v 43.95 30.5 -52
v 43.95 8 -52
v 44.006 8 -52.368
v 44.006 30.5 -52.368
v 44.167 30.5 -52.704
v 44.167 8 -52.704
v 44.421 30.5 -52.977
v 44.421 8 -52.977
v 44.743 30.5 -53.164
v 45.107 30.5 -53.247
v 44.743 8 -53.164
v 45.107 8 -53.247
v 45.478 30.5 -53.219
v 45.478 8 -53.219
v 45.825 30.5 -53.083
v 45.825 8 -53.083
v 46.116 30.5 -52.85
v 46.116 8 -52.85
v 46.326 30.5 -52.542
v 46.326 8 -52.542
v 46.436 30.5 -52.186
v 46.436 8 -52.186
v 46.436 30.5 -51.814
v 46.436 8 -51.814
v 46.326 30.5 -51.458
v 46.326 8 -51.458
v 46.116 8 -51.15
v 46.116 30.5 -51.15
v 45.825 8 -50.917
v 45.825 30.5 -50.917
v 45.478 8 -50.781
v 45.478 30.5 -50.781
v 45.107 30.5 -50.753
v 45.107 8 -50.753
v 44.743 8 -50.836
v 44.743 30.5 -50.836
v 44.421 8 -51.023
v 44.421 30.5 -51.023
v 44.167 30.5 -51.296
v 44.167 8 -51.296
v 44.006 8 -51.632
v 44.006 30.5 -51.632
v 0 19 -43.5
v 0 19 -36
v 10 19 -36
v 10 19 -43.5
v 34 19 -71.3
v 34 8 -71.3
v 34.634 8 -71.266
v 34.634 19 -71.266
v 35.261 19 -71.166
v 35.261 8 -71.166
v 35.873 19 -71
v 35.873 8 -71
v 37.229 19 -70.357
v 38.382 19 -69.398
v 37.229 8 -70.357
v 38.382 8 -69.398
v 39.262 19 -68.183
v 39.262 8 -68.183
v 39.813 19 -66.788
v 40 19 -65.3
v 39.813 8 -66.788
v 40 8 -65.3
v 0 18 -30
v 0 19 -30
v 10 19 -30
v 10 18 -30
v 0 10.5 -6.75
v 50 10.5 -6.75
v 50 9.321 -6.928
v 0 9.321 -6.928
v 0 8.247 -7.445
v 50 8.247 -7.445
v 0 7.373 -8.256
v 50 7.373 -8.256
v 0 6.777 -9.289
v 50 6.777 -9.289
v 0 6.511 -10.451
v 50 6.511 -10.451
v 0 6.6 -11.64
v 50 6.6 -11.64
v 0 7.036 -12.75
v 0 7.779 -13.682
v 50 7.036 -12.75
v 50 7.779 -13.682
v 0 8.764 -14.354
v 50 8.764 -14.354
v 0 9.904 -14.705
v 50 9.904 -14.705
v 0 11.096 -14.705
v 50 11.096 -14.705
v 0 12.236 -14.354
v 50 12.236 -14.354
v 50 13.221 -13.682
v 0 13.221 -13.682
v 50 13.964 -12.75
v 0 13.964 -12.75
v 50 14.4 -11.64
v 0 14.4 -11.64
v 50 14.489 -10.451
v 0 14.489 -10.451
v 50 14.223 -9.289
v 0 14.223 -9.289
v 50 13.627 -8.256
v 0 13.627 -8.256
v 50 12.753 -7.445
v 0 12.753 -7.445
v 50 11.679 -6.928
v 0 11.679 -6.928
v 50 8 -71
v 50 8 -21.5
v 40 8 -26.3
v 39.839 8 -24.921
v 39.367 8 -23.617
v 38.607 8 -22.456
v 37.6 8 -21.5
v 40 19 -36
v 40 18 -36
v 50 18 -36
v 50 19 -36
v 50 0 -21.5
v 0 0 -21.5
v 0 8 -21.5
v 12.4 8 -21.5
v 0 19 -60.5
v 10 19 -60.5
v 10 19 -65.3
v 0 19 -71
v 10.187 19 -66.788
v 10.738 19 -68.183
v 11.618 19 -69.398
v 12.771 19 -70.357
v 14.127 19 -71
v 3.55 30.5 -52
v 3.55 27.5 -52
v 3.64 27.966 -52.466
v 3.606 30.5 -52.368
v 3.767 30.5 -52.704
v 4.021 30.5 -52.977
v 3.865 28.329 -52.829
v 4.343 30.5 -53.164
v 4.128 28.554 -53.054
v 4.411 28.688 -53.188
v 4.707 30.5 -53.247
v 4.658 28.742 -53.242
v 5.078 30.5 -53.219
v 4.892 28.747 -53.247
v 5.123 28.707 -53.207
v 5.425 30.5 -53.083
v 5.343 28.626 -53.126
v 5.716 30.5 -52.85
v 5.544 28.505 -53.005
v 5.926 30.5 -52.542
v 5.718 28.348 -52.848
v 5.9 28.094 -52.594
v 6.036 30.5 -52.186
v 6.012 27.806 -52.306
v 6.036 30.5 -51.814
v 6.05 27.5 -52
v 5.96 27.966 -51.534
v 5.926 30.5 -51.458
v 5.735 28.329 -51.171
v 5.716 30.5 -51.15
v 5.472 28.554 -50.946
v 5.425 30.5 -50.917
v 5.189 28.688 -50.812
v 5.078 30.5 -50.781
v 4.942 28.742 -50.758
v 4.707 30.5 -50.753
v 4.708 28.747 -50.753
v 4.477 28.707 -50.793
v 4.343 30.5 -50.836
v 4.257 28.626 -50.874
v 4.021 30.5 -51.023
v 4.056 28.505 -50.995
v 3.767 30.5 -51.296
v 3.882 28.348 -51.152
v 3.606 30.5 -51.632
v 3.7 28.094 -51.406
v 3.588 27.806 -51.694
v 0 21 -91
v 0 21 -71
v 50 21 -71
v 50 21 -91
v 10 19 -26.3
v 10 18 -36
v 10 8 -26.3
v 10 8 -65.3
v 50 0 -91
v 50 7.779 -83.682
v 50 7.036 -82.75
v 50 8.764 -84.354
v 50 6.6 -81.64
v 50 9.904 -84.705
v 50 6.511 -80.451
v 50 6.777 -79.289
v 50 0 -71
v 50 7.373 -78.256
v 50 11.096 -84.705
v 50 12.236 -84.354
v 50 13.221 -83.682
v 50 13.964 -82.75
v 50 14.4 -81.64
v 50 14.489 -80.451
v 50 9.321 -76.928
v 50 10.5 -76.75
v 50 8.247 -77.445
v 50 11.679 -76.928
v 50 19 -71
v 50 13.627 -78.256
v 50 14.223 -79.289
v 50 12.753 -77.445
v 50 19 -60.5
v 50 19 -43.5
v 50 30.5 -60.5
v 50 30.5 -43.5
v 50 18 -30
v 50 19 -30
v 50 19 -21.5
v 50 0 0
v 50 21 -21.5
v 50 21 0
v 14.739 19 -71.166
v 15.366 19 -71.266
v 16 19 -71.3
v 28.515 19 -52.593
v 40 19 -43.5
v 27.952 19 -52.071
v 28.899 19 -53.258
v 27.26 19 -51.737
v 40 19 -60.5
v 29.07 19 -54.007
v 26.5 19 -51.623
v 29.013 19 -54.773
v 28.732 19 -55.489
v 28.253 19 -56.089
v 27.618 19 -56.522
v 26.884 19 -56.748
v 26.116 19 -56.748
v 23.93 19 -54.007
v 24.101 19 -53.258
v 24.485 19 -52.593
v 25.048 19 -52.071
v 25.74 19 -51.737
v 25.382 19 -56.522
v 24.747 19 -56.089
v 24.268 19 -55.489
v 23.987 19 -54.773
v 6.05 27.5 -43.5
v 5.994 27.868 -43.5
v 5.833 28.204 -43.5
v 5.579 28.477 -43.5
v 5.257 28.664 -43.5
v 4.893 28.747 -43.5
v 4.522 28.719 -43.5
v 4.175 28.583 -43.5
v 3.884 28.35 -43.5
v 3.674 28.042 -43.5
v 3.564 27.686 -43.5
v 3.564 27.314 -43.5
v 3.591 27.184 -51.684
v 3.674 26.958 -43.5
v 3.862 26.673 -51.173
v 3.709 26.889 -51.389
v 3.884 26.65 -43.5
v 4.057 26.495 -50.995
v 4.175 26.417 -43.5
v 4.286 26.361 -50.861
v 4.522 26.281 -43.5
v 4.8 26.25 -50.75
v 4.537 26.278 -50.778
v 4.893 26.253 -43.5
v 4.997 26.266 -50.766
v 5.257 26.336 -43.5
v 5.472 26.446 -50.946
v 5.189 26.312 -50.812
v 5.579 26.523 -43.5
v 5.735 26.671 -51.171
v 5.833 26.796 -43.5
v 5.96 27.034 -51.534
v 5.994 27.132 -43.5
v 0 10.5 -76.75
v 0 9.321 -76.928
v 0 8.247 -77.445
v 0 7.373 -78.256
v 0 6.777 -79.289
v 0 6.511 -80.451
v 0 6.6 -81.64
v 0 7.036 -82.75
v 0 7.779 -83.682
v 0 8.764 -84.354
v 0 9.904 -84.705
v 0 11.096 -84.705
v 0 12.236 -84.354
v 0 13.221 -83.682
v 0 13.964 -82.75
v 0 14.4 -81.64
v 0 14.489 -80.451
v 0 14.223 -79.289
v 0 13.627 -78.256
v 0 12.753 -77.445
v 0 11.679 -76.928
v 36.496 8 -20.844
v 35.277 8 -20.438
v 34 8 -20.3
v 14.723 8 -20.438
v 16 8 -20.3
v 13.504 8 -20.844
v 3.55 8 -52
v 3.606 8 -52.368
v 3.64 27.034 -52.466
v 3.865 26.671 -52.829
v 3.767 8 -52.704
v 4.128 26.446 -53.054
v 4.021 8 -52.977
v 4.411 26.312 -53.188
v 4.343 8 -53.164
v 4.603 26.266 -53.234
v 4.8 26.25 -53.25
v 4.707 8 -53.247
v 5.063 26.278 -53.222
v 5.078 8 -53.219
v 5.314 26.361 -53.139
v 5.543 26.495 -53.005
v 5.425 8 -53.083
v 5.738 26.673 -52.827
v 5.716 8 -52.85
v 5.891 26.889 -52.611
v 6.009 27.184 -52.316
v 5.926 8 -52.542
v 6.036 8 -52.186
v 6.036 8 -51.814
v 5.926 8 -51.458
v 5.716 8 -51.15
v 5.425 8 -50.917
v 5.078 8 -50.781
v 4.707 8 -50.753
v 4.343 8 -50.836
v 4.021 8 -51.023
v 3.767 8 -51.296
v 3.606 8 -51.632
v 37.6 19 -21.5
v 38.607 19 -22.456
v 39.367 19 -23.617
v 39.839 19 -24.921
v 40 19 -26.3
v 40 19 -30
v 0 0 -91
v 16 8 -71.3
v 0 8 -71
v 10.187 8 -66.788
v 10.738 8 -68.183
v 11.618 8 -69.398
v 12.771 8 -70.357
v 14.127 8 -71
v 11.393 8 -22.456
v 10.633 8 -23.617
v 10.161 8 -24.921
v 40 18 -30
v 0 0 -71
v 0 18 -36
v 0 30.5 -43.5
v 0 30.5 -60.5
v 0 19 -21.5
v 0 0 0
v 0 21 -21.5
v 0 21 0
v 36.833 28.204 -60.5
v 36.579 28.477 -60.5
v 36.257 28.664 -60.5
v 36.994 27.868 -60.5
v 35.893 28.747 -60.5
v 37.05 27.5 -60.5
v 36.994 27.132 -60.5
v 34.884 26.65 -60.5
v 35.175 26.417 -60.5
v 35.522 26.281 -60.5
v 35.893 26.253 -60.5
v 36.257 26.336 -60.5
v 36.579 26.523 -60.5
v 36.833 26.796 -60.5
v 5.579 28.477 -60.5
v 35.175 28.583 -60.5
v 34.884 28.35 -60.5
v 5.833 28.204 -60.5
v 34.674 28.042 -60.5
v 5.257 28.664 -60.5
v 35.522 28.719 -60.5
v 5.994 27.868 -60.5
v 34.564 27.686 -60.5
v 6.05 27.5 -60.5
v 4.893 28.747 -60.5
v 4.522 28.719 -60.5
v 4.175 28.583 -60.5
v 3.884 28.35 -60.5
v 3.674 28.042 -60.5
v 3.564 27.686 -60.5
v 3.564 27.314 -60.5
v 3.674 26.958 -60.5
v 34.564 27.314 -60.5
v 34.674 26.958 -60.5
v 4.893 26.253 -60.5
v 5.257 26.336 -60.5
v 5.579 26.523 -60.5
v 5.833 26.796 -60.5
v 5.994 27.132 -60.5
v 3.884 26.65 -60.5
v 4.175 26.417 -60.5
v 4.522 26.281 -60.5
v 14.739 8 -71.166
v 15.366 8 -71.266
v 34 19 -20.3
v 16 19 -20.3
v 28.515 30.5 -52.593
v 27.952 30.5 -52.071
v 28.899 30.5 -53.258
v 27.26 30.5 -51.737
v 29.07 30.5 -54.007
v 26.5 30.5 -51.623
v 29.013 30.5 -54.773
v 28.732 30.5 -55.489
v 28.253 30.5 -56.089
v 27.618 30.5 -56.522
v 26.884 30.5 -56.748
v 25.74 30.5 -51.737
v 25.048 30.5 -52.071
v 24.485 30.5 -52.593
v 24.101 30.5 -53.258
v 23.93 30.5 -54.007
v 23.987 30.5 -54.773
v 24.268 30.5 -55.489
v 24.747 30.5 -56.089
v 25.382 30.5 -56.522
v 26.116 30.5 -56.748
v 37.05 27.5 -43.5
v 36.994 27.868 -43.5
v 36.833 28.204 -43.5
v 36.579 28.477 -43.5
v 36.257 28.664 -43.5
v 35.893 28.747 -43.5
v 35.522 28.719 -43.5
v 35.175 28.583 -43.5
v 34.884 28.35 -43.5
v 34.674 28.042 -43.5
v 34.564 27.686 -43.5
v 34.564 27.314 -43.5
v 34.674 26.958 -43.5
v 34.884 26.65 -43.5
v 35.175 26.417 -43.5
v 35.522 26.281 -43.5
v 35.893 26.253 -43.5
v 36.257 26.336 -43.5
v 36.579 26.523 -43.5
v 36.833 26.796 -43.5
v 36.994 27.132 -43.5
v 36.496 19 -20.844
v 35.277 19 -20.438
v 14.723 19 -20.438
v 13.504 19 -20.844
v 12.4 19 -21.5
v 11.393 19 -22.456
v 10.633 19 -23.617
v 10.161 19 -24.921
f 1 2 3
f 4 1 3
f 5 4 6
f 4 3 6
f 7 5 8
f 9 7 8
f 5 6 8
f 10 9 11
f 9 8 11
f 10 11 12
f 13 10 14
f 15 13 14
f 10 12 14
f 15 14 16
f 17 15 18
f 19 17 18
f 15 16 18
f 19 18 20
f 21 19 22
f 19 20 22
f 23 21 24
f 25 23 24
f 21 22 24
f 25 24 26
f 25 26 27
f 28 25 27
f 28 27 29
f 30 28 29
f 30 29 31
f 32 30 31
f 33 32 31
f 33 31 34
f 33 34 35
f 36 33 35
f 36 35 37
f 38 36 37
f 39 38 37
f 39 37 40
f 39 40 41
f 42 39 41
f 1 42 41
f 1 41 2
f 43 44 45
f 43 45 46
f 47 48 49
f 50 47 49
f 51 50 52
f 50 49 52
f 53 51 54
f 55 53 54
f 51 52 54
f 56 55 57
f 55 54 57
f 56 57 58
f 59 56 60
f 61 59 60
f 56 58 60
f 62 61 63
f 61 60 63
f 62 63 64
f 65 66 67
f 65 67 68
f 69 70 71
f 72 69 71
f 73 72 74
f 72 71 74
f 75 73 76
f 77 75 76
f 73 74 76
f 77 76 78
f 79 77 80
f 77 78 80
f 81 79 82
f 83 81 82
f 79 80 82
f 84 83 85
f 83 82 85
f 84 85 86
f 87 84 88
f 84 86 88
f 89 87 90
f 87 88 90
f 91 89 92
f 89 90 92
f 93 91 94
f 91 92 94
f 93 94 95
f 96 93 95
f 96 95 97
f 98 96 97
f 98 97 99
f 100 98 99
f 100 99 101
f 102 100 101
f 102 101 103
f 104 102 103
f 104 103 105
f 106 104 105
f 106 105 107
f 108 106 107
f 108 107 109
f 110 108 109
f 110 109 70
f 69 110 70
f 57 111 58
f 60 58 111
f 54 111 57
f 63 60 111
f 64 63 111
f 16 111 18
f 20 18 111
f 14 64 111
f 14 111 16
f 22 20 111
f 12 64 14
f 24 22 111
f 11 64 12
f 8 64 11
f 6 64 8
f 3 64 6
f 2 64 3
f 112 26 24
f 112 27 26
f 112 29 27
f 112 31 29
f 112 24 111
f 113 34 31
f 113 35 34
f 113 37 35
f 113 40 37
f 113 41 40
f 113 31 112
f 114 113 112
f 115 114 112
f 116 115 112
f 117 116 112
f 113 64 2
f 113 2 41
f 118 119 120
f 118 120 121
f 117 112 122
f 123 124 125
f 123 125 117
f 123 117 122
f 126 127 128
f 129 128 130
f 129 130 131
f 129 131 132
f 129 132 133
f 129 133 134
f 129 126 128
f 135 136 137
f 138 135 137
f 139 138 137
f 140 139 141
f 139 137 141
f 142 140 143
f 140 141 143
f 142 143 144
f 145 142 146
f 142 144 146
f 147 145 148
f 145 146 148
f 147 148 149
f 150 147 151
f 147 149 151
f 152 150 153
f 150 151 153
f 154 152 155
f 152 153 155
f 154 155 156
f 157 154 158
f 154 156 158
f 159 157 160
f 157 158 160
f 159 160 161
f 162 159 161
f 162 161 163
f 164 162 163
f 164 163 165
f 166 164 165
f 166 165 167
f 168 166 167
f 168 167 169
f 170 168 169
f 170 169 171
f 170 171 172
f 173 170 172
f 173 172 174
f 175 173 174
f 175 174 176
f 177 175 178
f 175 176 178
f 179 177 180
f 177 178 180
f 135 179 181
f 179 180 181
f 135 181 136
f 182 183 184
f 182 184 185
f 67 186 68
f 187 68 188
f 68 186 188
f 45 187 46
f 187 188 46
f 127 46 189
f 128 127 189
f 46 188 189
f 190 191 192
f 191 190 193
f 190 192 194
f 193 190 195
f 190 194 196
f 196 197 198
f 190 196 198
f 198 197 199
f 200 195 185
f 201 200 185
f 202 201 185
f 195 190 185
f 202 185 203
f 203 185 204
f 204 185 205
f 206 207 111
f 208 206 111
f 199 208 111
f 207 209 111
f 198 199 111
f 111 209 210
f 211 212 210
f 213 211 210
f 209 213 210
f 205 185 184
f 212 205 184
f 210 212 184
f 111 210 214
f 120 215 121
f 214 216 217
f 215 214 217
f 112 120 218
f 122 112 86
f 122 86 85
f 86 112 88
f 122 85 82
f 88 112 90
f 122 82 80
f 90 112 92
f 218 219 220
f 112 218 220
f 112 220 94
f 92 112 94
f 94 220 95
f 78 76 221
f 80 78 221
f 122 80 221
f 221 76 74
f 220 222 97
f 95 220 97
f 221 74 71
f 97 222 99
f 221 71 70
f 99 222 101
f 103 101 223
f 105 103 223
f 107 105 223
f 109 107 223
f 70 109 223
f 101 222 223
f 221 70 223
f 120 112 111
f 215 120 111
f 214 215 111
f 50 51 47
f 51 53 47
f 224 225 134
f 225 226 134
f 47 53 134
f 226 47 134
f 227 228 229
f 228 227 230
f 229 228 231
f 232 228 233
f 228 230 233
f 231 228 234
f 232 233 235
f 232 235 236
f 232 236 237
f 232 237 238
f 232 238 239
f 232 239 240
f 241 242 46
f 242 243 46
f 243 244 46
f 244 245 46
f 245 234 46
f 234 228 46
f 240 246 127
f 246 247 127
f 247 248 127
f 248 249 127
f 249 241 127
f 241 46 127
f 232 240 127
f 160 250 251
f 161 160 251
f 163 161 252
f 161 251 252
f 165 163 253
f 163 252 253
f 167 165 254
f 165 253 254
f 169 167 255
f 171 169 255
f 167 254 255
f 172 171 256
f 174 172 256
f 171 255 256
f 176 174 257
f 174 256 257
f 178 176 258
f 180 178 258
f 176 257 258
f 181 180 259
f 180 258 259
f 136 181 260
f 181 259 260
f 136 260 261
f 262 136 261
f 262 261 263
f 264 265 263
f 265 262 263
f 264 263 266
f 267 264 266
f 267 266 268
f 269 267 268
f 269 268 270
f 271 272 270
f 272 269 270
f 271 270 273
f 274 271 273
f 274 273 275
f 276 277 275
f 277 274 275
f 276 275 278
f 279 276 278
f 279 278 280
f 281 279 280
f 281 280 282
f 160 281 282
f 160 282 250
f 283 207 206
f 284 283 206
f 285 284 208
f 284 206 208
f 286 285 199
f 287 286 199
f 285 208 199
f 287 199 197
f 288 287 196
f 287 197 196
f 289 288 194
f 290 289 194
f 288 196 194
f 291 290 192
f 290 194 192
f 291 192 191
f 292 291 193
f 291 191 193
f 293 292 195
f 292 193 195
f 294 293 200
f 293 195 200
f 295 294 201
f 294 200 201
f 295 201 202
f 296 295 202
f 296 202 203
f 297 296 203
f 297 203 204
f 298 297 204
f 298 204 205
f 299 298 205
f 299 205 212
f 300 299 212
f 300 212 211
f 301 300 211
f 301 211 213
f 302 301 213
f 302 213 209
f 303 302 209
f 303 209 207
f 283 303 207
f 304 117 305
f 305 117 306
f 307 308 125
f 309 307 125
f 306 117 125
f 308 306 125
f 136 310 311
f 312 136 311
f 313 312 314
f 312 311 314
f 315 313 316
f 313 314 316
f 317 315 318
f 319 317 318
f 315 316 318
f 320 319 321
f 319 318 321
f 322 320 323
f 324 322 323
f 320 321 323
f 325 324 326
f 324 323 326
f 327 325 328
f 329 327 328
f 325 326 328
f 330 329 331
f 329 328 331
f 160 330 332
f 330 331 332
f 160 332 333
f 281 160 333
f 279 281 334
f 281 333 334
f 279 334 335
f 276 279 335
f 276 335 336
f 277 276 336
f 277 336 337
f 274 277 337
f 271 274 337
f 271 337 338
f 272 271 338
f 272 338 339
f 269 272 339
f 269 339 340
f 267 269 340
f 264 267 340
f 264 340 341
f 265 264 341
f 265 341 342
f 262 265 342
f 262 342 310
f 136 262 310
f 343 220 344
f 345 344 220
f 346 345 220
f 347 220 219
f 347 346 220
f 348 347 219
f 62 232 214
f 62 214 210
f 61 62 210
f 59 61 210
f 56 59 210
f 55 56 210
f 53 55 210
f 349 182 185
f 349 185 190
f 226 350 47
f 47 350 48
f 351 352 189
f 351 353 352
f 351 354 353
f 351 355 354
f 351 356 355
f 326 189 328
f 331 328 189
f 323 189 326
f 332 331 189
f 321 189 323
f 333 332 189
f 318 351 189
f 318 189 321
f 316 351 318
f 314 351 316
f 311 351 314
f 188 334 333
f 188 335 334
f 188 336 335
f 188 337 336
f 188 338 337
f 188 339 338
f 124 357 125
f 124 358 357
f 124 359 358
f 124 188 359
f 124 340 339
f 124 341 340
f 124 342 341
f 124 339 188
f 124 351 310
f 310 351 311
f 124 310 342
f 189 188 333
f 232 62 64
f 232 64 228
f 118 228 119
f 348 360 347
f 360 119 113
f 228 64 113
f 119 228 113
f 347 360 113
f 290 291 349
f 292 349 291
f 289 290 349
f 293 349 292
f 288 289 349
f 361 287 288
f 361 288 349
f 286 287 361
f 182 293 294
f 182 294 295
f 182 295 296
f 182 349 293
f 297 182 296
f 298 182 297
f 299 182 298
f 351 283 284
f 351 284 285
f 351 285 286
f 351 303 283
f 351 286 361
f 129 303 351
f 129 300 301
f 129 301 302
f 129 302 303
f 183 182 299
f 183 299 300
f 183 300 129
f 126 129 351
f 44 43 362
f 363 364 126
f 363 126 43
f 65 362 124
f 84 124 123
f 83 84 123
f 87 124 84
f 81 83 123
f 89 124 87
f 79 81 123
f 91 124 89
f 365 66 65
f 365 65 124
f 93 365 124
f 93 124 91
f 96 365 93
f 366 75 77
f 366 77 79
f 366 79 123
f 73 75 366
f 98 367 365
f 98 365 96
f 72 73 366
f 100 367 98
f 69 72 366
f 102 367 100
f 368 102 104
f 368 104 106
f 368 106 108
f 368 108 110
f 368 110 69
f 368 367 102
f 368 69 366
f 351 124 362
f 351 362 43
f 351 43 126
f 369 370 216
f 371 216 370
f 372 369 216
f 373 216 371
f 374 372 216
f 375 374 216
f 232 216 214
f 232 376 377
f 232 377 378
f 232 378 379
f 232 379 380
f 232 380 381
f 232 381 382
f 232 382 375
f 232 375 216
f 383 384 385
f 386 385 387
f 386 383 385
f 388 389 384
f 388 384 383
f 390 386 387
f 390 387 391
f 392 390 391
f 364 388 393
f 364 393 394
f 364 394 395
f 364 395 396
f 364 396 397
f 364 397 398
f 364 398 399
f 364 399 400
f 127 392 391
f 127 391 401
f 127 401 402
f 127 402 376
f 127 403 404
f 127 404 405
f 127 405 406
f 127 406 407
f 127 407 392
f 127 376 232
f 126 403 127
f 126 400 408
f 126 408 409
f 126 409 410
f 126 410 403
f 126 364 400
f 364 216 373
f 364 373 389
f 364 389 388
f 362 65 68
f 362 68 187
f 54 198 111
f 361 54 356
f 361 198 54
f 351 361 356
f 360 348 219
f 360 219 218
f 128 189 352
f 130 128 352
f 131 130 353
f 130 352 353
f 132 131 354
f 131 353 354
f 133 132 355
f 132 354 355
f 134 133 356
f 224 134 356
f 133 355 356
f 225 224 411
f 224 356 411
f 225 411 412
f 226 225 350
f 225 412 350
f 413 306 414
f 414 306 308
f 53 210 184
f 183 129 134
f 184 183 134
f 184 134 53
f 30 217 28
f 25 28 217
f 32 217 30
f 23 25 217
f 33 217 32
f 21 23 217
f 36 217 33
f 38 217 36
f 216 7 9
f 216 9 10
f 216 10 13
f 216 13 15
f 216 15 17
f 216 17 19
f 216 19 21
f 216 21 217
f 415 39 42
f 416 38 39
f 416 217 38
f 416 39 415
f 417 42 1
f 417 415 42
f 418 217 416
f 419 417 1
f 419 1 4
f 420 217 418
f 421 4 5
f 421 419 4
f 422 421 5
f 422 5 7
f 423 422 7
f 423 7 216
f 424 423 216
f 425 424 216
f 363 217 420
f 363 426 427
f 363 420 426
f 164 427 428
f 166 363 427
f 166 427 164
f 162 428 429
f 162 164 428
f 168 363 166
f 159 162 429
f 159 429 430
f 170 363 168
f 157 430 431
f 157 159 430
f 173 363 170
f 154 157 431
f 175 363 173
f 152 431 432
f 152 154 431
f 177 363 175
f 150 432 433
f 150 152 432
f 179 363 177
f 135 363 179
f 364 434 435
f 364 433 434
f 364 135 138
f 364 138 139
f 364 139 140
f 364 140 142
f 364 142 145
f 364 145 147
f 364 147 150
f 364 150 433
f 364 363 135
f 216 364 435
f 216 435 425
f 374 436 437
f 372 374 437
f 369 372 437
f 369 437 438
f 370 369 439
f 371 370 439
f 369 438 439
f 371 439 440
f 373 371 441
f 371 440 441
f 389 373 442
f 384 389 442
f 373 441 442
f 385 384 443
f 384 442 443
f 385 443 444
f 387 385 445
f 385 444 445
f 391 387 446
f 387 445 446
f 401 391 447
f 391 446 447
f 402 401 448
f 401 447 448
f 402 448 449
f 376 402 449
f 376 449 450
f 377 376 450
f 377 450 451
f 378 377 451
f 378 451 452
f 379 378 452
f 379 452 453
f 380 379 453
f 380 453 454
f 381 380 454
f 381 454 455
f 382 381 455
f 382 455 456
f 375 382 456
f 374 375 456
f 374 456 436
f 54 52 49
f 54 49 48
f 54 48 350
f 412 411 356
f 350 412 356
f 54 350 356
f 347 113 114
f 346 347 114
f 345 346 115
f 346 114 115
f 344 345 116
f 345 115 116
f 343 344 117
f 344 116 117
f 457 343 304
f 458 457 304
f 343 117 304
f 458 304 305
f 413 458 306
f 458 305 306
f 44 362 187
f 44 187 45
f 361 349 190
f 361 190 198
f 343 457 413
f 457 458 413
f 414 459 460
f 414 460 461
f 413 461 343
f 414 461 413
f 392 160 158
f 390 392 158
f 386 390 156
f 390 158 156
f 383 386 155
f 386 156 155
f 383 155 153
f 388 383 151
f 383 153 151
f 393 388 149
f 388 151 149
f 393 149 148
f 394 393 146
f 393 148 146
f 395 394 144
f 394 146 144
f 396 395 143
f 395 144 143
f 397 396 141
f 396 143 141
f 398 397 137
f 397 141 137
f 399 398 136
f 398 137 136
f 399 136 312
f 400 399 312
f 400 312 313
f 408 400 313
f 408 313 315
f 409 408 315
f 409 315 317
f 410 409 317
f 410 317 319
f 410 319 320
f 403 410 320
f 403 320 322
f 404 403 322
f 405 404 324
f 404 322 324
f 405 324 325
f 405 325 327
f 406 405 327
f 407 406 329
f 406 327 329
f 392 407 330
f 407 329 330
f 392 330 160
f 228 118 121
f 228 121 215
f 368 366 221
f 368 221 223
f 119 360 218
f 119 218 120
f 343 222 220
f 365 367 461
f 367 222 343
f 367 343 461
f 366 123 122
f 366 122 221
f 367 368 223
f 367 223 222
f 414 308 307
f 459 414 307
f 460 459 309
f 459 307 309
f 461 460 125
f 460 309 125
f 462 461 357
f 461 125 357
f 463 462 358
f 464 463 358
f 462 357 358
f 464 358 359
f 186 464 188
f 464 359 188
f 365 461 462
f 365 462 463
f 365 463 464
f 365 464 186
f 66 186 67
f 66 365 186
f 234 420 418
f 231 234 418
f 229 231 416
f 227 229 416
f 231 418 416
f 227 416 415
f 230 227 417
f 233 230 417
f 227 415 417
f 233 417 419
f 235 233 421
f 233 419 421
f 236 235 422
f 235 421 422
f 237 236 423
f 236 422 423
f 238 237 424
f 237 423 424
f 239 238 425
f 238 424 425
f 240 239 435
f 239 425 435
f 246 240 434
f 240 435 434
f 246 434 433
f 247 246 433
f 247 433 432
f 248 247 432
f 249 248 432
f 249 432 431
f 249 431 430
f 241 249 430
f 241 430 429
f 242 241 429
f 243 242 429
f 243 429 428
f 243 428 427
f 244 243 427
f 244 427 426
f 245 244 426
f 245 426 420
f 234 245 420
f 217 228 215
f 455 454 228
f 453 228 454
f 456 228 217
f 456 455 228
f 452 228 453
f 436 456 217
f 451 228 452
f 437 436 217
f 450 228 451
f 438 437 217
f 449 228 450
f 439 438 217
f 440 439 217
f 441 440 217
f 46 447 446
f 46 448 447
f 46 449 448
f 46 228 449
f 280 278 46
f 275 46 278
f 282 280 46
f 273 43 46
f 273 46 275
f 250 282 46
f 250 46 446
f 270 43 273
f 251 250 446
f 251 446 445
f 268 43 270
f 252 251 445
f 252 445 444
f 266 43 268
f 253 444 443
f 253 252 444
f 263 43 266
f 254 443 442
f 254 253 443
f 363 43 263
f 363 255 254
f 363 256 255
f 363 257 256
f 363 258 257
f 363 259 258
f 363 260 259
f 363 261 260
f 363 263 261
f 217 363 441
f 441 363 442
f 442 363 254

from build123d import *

# Parameters (mm, degrees)
BOSS_EXTRUDE1_DEPTH            = 50
CUT_EXTRUDE1_REACH             = 108.241
M3_TAPPED_HOLE1_D              = 2.5
M3_TAPPED_HOLE2_D              = 2.5
SKETCH7_R                      = 2.577157182
CUT_EXTRUDE2_DEPTH             = 109.218528913
CUT_EXTRUDE3_REACH             = 110.219
SKETCH8_R                      = 4
CUT_EXTRUDE3_DIRECTION_2_DEPTH = 109.218528913


with BuildPart() as part:
    # Sketch1 → Boss-Extrude1 (new body)
    with BuildSketch(Plane(origin=(0, 0, 0), x_dir=(0, 0, -1), z_dir=(1, 0, 0))):
        Polygon((0, 0), (0, 21), (21.5, 21), (21.5, 19), (30, 19), (30, 18), (36, 18), (36, 19), (43.5, 19), (43.5, 30.5), (60.5, 30.5), (60.5, 19), (71, 19), (71, 21), (91, 21), (91, 0), (71, 0), (71, 8), (21.5, 8), (21.5, 0), align=None)
    extrude(amount=BOSS_EXTRUDE1_DEPTH)

    # Cut-Extrude1: up to this face of the body (flat: up to its plane)
    cut_extrude1_end = Plane(part.part.faces().sort_by_distance((25, 19, -65.75))[0])
    # Sketch2 → Cut-Extrude1 (cut, up to the picked face)
    with BuildSketch(Plane(origin=(0, 8, 0), x_dir=(1, 0, 0), z_dir=(0, 1, 0)), mode=Mode.PRIVATE) as cut_extrude1_sk1:
        with BuildLine():
            Line((16, 71.3), (34, 71.3))
            ThreePointArc((34, 71.3), (38.242640687, 69.542640687), (40, 65.3))
            Line((40, 65.3), (40, 26.3))
            ThreePointArc((40, 26.3), (38.242640687, 22.057359313), (34, 20.3))
            Line((34, 20.3), (16, 20.3))
            ThreePointArc((16, 20.3), (11.757359313, 22.057359313), (10, 26.3))
            Line((10, 26.3), (10, 65.3))
            ThreePointArc((10, 65.3), (11.757359313, 69.542640687), (16, 71.3))
        make_face()
    cut_extrude1_tool1 = split(extrude(cut_extrude1_sk1.sketch, amount=CUT_EXTRUDE1_REACH, mode=Mode.PRIVATE), bisect_by=cut_extrude1_end, keep=Keep.BOTH, mode=Mode.PRIVATE)
    add(cut_extrude1_tool1.solids().sort_by(Axis((25, 8, -45.8), (0, 1, 0)))[0], mode=Mode.SUBTRACT)

    # M3 Tapped Hole1 (through all)
    with Locations(Plane(origin=(0, 30.5, 0), x_dir=(1, 0, 0), z_dir=(0, 1, 0))):
        with Locations((4.8, 52), (45.2, 52)):
            Hole(M3_TAPPED_HOLE1_D / 2)

    # M3 Tapped Hole2 (through all)
    with Locations(Plane(origin=(0, 0, -60.5), x_dir=(-1, 0, 0), z_dir=(0, 0, -1))):
        with Locations((-4.8, 27.5), (-35.8, 27.5)):
            Hole(M3_TAPPED_HOLE2_D / 2)

    # Sketch7 → Cut-Extrude2 (cut, through all)
    with BuildSketch(Plane(origin=(0, 30.5, 0), x_dir=(1, 0, 0), z_dir=(0, 1, 0))):
        with Locations(Location((26.5, 54.2, 0), (0, 0, 270))):
            Circle(SKETCH7_R)
    extrude(amount=-CUT_EXTRUDE2_DEPTH, mode=Mode.SUBTRACT)

    # Sketch8 → Cut-Extrude3 (cut, up to next)
    with BuildSketch(Plane(origin=(50, 0, 0), x_dir=(0, 0, -1), z_dir=(1, 0, 0)), mode=Mode.PRIVATE) as cut_extrude3_sk1:
        with Locations(Location((10.75, 10.5, 0), (0, 0, 180))):
            Circle(SKETCH8_R)
    cut_extrude3_tool1 = extrude(cut_extrude3_sk1.sketch, amount=-CUT_EXTRUDE3_REACH, mode=Mode.PRIVATE) & part.part
    # Sketch8 → Cut-Extrude3 (cut, up to next)
    with BuildSketch(Plane(origin=(50, 0, 0), x_dir=(0, 0, -1), z_dir=(1, 0, 0)), mode=Mode.PRIVATE) as cut_extrude3_sk2:
        with Locations(Location((80.75, 10.5, 0), (0, 0, 180))):
            Circle(SKETCH8_R)
    cut_extrude3_tool2 = extrude(cut_extrude3_sk2.sketch, amount=-CUT_EXTRUDE3_REACH, mode=Mode.PRIVATE) & part.part
    add(cut_extrude3_tool1.solids().sort_by_distance((50, 10.5, -10.75))[0], mode=Mode.SUBTRACT)
    add(cut_extrude3_tool2.solids().sort_by_distance((50, 10.5, -80.75))[0], mode=Mode.SUBTRACT)

    # Sketch8 → Cut-Extrude3 direction 2 (cut)
    with BuildSketch(Plane(origin=(50, 0, 0), x_dir=(0, 0, -1), z_dir=(1, 0, 0))):
        with Locations(Location((10.75, 10.5, 0), (0, 0, 180))):
            Circle(SKETCH8_R)
        with Locations(Location((80.75, 10.5, 0), (0, 0, 180))):
            Circle(SKETCH8_R)
    extrude(amount=CUT_EXTRUDE3_DIRECTION_2_DEPTH, mode=Mode.SUBTRACT)


solid = part.part
